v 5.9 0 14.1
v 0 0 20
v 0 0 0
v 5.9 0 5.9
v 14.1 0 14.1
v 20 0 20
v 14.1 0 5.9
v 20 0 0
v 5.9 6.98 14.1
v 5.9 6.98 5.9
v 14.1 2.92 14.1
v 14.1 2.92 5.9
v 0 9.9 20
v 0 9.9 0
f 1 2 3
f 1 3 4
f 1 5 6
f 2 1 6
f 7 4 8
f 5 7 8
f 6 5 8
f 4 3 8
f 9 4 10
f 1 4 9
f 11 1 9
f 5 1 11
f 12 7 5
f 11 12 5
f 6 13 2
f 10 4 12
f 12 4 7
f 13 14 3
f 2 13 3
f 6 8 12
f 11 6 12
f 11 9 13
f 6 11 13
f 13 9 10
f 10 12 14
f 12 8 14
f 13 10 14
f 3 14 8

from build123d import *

# Parameters (mm, degrees)
SALIENTE_EXTRUIR1_DEPTH = 20
CROQUIS2_W              = 8.2
CROQUIS2_H              = 8.2
CORTAR_EXTRUIR1_DEPTH   = 20


with BuildPart() as part:
    # Croquis1 → Saliente-Extruir1 (new body)
    with BuildSketch(Plane.XY):
        Polygon((0, 0), (20, 0), (0, 9.9), align=None)
    extrude(amount=SALIENTE_EXTRUIR1_DEPTH)

    # Croquis2 → Cortar-Extruir1 (cut)
    with BuildSketch(Plane.XZ):
        with Locations((10, 10)):
            Rectangle(CROQUIS2_W, CROQUIS2_H)
    extrude(amount=-CORTAR_EXTRUIR1_DEPTH, mode=Mode.SUBTRACT)


solid = part.part
